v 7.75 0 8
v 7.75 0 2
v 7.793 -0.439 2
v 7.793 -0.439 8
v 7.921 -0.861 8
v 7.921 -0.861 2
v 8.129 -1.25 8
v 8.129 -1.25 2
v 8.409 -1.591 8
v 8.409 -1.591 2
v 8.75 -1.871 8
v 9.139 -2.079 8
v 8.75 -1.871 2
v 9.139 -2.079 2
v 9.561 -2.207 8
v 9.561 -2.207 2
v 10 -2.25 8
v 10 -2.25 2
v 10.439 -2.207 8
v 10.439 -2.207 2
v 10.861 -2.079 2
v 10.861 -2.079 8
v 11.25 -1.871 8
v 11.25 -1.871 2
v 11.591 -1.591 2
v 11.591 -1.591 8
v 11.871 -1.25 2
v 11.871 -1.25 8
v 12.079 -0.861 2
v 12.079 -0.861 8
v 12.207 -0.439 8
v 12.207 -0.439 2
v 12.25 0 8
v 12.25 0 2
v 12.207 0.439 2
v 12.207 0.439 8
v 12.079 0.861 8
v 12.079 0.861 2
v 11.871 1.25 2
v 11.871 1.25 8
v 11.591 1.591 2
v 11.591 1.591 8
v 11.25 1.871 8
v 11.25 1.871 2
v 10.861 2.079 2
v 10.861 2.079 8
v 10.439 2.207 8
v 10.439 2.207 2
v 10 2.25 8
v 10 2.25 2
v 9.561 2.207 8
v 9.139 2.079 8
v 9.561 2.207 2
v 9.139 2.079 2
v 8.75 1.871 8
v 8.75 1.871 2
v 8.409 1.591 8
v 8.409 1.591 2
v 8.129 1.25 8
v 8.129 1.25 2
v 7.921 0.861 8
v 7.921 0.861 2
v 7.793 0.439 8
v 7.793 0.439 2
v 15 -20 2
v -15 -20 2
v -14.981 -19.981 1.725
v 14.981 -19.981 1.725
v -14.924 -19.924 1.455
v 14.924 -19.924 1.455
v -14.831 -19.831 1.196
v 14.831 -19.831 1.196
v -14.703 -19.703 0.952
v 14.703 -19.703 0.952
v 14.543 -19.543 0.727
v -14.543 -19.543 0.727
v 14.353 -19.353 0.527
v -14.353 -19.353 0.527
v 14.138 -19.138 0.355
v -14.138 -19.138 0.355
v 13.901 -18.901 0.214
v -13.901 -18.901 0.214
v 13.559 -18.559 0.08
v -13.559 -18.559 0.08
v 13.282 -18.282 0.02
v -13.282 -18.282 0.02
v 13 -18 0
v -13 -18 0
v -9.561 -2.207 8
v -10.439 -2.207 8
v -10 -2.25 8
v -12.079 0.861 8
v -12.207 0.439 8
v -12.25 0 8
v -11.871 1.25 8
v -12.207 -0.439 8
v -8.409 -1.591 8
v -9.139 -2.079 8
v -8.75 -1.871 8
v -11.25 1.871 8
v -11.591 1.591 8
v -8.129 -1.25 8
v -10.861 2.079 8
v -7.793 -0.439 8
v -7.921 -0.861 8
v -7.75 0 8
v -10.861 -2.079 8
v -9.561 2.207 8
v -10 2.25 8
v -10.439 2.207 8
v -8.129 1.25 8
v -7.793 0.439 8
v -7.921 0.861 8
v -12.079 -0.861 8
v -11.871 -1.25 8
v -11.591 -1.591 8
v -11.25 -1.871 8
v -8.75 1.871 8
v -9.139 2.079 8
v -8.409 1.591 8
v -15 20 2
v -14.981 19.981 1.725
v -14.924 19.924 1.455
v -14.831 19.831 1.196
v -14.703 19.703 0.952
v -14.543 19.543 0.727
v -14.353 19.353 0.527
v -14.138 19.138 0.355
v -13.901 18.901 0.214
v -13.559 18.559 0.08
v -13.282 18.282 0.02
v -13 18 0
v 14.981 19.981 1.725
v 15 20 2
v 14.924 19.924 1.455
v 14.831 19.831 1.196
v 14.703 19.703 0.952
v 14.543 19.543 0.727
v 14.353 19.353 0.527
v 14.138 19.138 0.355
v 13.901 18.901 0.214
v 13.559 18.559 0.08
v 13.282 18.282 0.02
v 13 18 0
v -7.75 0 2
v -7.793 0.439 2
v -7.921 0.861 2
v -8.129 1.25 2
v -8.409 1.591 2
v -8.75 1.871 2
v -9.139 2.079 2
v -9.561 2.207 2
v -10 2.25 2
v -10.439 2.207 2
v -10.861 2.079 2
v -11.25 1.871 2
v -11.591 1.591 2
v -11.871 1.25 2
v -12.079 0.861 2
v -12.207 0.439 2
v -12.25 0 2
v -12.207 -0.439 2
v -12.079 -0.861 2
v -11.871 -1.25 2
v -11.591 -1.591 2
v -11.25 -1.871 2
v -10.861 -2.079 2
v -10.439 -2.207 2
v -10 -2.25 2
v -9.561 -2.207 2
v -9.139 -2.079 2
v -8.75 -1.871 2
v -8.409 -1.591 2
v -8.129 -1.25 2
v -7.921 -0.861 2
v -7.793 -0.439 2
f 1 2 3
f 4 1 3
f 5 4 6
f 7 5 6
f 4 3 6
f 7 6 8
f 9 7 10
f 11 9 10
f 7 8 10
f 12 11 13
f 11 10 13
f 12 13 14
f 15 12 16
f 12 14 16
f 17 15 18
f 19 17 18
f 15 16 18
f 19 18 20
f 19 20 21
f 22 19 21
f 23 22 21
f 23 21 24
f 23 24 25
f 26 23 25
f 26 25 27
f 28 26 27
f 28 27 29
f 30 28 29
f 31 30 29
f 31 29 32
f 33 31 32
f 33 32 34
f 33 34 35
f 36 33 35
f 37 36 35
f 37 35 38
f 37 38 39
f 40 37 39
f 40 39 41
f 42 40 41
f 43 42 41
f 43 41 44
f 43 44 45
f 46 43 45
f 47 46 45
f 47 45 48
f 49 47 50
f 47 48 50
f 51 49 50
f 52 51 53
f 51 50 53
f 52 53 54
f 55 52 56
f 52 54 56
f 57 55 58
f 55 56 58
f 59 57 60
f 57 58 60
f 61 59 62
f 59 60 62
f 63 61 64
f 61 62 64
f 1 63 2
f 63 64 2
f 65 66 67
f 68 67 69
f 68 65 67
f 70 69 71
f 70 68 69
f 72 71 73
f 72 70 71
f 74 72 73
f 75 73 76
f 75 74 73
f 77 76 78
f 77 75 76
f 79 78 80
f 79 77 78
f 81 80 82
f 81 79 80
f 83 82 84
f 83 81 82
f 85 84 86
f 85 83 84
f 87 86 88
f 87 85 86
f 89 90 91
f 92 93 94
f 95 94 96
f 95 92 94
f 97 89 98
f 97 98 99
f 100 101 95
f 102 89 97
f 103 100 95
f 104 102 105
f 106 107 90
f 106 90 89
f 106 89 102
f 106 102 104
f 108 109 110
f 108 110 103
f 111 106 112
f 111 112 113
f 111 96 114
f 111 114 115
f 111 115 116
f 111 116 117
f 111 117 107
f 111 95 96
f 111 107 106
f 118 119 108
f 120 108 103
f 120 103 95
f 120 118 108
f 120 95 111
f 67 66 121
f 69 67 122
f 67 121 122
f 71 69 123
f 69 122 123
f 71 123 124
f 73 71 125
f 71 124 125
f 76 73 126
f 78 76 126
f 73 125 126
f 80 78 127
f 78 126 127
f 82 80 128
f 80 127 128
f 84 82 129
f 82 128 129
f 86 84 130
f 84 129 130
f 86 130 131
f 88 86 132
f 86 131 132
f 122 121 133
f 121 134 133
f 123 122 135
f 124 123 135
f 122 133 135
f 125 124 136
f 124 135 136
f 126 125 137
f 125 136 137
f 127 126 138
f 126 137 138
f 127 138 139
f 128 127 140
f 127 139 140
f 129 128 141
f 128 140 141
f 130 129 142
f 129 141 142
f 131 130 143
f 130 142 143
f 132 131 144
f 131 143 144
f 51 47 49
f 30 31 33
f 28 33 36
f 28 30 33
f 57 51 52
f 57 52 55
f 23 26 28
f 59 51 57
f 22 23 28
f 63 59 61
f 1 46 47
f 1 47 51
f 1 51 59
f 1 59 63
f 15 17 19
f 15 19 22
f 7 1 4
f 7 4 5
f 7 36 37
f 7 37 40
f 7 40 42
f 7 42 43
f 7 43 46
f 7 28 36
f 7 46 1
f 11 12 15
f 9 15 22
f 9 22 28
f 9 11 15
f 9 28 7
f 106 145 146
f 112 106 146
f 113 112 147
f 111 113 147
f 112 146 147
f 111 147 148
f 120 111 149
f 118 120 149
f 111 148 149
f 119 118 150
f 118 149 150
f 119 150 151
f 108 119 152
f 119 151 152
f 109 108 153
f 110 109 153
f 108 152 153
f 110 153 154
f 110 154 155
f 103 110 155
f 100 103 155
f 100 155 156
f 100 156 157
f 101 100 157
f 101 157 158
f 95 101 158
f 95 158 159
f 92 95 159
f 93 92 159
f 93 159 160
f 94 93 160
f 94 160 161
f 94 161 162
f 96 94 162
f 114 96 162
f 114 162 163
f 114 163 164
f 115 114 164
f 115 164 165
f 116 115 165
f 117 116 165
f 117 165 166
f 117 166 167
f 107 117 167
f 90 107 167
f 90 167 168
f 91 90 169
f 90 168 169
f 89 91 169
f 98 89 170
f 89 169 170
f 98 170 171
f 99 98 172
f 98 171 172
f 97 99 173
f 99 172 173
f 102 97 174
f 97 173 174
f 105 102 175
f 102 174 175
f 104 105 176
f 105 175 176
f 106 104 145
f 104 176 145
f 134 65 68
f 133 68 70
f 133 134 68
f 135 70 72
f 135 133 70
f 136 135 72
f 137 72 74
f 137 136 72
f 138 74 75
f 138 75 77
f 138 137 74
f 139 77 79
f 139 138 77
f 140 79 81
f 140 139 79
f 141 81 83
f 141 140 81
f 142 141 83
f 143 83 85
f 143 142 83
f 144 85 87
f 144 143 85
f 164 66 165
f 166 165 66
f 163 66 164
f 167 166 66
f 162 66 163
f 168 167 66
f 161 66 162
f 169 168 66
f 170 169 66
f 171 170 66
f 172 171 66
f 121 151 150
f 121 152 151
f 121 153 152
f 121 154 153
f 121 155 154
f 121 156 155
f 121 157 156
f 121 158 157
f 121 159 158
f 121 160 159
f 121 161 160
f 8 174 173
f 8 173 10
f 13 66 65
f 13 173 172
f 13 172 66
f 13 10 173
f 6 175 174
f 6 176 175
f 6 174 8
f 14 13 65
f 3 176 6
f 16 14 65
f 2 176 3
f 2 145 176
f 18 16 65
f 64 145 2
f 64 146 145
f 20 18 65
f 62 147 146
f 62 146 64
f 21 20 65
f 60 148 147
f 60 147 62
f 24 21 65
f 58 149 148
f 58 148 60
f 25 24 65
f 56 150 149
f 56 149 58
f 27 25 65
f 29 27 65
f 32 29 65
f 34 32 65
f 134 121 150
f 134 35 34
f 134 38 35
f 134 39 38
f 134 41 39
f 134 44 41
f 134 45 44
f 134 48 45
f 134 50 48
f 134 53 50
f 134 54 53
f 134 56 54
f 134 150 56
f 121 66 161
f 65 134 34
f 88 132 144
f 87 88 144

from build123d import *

# Parameters (mm, degrees)
SKETCH1_W           = 30
SKETCH1_H           = 40
SKETCH1_R           = 2.25
BOSS_EXTRUDE1_DEPTH = 2
SKETCH1_4_R         = 2.25
BOSS_EXTRUDE2_DEPTH = 8
FILLET1_R           = 2


with BuildPart() as part:
    # Sketch1 → Boss-Extrude1 (new body)
    with BuildSketch(Plane.XY):
        Rectangle(SKETCH1_W, SKETCH1_H)
        with Locations((-10, 0)):
            Circle(SKETCH1_R, mode=Mode.SUBTRACT)
        with Locations(Location((10, 0, 0), (0, 0, 180))):
            Circle(SKETCH1_R, mode=Mode.SUBTRACT)
    extrude(amount=BOSS_EXTRUDE1_DEPTH)

    # Sketch1<4> → Boss-Extrude2 (add)
    with BuildSketch(Plane.XY):
        with Locations((-10, 0)):
            Circle(SKETCH1_4_R)
        with Locations(Location((10, 0, 0), (0, 0, 180))):
            Circle(SKETCH1_4_R)
    extrude(amount=BOSS_EXTRUDE2_DEPTH)

    # Fillet1
    fillet1_edges = [part.edges().sort_by_distance(p)[0] for p in [
        (0, 20, 0),
        (-15, 0, 0),
        (0, -20, 0),
        (15, 0, 0),
    ]]
    fillet(fillet1_edges, radius=FILLET1_R - 0.0001)  # a hair under: the kernel refuses the full size


solid = part.part
